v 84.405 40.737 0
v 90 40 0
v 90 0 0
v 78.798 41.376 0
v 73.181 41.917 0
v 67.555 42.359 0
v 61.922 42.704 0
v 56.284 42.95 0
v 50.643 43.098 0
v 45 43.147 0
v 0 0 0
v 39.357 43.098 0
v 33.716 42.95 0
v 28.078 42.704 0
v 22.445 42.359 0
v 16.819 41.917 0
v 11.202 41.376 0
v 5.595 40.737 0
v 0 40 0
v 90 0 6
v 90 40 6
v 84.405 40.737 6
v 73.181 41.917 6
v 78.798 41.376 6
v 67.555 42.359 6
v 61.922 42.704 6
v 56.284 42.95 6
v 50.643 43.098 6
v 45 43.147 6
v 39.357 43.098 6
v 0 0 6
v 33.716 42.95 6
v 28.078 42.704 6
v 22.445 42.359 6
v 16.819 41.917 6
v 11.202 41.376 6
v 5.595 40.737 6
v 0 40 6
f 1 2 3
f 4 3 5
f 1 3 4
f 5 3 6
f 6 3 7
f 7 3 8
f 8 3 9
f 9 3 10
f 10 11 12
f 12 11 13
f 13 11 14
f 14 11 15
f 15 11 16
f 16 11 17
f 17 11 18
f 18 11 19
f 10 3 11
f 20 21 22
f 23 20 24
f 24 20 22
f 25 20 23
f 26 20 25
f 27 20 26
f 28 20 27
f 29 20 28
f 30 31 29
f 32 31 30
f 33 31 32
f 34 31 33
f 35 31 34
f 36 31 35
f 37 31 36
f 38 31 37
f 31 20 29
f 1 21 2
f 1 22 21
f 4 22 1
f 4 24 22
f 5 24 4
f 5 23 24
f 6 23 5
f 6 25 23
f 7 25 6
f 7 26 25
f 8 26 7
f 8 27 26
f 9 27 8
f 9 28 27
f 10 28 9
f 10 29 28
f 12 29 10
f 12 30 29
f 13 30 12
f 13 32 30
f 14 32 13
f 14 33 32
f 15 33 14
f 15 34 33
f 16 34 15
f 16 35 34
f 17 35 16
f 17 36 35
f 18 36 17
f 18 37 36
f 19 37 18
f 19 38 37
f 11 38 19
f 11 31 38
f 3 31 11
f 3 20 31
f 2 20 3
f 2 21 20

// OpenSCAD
$fn = 32;

// ----------------------------------------------------------------------
// Arc profile plate: crown, 19 points
// ----------------------------------------------------------------------

// --- parameters (mm) ---
bar_l = 90;               // bar length, X
bar_w = 40;               // bar height at the ends, Y
arc_r = 323.34;           // radius of the crown arc
arc_angle = 16;           // crown arc angle, degrees
crown_rise = 3.15;        // rise of the crown over the ends
arc_step = 1;             // sampling step of the crown arc, degrees
plate_t = 6;              // plate thickness, Z
fit_tol = 0.05;           // declared fit tolerance (prompt contract)
free_tol = 0.3;           // declared free tolerance (prompt contract)

bbox_y = bar_w + crown_rise;  // full height with the crown

profile = [[90, 40], [84.405, 40.737], [78.798, 41.376], [73.181, 41.917], [67.555, 42.359], [61.922, 42.704], [56.284, 42.95], [50.643, 43.098], [45, 43.147], [39.357, 43.098], [33.716, 42.95], [28.078, 42.704], [22.445, 42.359], [16.819, 41.917], [11.202, 41.376], [5.595, 40.737], [0, 40], [0, 0], [90, 0]];  // primary outline, 19 points, counter clockwise

// --- the one profile operation ---
linear_extrude(height = plate_t) polygon(points = profile);
